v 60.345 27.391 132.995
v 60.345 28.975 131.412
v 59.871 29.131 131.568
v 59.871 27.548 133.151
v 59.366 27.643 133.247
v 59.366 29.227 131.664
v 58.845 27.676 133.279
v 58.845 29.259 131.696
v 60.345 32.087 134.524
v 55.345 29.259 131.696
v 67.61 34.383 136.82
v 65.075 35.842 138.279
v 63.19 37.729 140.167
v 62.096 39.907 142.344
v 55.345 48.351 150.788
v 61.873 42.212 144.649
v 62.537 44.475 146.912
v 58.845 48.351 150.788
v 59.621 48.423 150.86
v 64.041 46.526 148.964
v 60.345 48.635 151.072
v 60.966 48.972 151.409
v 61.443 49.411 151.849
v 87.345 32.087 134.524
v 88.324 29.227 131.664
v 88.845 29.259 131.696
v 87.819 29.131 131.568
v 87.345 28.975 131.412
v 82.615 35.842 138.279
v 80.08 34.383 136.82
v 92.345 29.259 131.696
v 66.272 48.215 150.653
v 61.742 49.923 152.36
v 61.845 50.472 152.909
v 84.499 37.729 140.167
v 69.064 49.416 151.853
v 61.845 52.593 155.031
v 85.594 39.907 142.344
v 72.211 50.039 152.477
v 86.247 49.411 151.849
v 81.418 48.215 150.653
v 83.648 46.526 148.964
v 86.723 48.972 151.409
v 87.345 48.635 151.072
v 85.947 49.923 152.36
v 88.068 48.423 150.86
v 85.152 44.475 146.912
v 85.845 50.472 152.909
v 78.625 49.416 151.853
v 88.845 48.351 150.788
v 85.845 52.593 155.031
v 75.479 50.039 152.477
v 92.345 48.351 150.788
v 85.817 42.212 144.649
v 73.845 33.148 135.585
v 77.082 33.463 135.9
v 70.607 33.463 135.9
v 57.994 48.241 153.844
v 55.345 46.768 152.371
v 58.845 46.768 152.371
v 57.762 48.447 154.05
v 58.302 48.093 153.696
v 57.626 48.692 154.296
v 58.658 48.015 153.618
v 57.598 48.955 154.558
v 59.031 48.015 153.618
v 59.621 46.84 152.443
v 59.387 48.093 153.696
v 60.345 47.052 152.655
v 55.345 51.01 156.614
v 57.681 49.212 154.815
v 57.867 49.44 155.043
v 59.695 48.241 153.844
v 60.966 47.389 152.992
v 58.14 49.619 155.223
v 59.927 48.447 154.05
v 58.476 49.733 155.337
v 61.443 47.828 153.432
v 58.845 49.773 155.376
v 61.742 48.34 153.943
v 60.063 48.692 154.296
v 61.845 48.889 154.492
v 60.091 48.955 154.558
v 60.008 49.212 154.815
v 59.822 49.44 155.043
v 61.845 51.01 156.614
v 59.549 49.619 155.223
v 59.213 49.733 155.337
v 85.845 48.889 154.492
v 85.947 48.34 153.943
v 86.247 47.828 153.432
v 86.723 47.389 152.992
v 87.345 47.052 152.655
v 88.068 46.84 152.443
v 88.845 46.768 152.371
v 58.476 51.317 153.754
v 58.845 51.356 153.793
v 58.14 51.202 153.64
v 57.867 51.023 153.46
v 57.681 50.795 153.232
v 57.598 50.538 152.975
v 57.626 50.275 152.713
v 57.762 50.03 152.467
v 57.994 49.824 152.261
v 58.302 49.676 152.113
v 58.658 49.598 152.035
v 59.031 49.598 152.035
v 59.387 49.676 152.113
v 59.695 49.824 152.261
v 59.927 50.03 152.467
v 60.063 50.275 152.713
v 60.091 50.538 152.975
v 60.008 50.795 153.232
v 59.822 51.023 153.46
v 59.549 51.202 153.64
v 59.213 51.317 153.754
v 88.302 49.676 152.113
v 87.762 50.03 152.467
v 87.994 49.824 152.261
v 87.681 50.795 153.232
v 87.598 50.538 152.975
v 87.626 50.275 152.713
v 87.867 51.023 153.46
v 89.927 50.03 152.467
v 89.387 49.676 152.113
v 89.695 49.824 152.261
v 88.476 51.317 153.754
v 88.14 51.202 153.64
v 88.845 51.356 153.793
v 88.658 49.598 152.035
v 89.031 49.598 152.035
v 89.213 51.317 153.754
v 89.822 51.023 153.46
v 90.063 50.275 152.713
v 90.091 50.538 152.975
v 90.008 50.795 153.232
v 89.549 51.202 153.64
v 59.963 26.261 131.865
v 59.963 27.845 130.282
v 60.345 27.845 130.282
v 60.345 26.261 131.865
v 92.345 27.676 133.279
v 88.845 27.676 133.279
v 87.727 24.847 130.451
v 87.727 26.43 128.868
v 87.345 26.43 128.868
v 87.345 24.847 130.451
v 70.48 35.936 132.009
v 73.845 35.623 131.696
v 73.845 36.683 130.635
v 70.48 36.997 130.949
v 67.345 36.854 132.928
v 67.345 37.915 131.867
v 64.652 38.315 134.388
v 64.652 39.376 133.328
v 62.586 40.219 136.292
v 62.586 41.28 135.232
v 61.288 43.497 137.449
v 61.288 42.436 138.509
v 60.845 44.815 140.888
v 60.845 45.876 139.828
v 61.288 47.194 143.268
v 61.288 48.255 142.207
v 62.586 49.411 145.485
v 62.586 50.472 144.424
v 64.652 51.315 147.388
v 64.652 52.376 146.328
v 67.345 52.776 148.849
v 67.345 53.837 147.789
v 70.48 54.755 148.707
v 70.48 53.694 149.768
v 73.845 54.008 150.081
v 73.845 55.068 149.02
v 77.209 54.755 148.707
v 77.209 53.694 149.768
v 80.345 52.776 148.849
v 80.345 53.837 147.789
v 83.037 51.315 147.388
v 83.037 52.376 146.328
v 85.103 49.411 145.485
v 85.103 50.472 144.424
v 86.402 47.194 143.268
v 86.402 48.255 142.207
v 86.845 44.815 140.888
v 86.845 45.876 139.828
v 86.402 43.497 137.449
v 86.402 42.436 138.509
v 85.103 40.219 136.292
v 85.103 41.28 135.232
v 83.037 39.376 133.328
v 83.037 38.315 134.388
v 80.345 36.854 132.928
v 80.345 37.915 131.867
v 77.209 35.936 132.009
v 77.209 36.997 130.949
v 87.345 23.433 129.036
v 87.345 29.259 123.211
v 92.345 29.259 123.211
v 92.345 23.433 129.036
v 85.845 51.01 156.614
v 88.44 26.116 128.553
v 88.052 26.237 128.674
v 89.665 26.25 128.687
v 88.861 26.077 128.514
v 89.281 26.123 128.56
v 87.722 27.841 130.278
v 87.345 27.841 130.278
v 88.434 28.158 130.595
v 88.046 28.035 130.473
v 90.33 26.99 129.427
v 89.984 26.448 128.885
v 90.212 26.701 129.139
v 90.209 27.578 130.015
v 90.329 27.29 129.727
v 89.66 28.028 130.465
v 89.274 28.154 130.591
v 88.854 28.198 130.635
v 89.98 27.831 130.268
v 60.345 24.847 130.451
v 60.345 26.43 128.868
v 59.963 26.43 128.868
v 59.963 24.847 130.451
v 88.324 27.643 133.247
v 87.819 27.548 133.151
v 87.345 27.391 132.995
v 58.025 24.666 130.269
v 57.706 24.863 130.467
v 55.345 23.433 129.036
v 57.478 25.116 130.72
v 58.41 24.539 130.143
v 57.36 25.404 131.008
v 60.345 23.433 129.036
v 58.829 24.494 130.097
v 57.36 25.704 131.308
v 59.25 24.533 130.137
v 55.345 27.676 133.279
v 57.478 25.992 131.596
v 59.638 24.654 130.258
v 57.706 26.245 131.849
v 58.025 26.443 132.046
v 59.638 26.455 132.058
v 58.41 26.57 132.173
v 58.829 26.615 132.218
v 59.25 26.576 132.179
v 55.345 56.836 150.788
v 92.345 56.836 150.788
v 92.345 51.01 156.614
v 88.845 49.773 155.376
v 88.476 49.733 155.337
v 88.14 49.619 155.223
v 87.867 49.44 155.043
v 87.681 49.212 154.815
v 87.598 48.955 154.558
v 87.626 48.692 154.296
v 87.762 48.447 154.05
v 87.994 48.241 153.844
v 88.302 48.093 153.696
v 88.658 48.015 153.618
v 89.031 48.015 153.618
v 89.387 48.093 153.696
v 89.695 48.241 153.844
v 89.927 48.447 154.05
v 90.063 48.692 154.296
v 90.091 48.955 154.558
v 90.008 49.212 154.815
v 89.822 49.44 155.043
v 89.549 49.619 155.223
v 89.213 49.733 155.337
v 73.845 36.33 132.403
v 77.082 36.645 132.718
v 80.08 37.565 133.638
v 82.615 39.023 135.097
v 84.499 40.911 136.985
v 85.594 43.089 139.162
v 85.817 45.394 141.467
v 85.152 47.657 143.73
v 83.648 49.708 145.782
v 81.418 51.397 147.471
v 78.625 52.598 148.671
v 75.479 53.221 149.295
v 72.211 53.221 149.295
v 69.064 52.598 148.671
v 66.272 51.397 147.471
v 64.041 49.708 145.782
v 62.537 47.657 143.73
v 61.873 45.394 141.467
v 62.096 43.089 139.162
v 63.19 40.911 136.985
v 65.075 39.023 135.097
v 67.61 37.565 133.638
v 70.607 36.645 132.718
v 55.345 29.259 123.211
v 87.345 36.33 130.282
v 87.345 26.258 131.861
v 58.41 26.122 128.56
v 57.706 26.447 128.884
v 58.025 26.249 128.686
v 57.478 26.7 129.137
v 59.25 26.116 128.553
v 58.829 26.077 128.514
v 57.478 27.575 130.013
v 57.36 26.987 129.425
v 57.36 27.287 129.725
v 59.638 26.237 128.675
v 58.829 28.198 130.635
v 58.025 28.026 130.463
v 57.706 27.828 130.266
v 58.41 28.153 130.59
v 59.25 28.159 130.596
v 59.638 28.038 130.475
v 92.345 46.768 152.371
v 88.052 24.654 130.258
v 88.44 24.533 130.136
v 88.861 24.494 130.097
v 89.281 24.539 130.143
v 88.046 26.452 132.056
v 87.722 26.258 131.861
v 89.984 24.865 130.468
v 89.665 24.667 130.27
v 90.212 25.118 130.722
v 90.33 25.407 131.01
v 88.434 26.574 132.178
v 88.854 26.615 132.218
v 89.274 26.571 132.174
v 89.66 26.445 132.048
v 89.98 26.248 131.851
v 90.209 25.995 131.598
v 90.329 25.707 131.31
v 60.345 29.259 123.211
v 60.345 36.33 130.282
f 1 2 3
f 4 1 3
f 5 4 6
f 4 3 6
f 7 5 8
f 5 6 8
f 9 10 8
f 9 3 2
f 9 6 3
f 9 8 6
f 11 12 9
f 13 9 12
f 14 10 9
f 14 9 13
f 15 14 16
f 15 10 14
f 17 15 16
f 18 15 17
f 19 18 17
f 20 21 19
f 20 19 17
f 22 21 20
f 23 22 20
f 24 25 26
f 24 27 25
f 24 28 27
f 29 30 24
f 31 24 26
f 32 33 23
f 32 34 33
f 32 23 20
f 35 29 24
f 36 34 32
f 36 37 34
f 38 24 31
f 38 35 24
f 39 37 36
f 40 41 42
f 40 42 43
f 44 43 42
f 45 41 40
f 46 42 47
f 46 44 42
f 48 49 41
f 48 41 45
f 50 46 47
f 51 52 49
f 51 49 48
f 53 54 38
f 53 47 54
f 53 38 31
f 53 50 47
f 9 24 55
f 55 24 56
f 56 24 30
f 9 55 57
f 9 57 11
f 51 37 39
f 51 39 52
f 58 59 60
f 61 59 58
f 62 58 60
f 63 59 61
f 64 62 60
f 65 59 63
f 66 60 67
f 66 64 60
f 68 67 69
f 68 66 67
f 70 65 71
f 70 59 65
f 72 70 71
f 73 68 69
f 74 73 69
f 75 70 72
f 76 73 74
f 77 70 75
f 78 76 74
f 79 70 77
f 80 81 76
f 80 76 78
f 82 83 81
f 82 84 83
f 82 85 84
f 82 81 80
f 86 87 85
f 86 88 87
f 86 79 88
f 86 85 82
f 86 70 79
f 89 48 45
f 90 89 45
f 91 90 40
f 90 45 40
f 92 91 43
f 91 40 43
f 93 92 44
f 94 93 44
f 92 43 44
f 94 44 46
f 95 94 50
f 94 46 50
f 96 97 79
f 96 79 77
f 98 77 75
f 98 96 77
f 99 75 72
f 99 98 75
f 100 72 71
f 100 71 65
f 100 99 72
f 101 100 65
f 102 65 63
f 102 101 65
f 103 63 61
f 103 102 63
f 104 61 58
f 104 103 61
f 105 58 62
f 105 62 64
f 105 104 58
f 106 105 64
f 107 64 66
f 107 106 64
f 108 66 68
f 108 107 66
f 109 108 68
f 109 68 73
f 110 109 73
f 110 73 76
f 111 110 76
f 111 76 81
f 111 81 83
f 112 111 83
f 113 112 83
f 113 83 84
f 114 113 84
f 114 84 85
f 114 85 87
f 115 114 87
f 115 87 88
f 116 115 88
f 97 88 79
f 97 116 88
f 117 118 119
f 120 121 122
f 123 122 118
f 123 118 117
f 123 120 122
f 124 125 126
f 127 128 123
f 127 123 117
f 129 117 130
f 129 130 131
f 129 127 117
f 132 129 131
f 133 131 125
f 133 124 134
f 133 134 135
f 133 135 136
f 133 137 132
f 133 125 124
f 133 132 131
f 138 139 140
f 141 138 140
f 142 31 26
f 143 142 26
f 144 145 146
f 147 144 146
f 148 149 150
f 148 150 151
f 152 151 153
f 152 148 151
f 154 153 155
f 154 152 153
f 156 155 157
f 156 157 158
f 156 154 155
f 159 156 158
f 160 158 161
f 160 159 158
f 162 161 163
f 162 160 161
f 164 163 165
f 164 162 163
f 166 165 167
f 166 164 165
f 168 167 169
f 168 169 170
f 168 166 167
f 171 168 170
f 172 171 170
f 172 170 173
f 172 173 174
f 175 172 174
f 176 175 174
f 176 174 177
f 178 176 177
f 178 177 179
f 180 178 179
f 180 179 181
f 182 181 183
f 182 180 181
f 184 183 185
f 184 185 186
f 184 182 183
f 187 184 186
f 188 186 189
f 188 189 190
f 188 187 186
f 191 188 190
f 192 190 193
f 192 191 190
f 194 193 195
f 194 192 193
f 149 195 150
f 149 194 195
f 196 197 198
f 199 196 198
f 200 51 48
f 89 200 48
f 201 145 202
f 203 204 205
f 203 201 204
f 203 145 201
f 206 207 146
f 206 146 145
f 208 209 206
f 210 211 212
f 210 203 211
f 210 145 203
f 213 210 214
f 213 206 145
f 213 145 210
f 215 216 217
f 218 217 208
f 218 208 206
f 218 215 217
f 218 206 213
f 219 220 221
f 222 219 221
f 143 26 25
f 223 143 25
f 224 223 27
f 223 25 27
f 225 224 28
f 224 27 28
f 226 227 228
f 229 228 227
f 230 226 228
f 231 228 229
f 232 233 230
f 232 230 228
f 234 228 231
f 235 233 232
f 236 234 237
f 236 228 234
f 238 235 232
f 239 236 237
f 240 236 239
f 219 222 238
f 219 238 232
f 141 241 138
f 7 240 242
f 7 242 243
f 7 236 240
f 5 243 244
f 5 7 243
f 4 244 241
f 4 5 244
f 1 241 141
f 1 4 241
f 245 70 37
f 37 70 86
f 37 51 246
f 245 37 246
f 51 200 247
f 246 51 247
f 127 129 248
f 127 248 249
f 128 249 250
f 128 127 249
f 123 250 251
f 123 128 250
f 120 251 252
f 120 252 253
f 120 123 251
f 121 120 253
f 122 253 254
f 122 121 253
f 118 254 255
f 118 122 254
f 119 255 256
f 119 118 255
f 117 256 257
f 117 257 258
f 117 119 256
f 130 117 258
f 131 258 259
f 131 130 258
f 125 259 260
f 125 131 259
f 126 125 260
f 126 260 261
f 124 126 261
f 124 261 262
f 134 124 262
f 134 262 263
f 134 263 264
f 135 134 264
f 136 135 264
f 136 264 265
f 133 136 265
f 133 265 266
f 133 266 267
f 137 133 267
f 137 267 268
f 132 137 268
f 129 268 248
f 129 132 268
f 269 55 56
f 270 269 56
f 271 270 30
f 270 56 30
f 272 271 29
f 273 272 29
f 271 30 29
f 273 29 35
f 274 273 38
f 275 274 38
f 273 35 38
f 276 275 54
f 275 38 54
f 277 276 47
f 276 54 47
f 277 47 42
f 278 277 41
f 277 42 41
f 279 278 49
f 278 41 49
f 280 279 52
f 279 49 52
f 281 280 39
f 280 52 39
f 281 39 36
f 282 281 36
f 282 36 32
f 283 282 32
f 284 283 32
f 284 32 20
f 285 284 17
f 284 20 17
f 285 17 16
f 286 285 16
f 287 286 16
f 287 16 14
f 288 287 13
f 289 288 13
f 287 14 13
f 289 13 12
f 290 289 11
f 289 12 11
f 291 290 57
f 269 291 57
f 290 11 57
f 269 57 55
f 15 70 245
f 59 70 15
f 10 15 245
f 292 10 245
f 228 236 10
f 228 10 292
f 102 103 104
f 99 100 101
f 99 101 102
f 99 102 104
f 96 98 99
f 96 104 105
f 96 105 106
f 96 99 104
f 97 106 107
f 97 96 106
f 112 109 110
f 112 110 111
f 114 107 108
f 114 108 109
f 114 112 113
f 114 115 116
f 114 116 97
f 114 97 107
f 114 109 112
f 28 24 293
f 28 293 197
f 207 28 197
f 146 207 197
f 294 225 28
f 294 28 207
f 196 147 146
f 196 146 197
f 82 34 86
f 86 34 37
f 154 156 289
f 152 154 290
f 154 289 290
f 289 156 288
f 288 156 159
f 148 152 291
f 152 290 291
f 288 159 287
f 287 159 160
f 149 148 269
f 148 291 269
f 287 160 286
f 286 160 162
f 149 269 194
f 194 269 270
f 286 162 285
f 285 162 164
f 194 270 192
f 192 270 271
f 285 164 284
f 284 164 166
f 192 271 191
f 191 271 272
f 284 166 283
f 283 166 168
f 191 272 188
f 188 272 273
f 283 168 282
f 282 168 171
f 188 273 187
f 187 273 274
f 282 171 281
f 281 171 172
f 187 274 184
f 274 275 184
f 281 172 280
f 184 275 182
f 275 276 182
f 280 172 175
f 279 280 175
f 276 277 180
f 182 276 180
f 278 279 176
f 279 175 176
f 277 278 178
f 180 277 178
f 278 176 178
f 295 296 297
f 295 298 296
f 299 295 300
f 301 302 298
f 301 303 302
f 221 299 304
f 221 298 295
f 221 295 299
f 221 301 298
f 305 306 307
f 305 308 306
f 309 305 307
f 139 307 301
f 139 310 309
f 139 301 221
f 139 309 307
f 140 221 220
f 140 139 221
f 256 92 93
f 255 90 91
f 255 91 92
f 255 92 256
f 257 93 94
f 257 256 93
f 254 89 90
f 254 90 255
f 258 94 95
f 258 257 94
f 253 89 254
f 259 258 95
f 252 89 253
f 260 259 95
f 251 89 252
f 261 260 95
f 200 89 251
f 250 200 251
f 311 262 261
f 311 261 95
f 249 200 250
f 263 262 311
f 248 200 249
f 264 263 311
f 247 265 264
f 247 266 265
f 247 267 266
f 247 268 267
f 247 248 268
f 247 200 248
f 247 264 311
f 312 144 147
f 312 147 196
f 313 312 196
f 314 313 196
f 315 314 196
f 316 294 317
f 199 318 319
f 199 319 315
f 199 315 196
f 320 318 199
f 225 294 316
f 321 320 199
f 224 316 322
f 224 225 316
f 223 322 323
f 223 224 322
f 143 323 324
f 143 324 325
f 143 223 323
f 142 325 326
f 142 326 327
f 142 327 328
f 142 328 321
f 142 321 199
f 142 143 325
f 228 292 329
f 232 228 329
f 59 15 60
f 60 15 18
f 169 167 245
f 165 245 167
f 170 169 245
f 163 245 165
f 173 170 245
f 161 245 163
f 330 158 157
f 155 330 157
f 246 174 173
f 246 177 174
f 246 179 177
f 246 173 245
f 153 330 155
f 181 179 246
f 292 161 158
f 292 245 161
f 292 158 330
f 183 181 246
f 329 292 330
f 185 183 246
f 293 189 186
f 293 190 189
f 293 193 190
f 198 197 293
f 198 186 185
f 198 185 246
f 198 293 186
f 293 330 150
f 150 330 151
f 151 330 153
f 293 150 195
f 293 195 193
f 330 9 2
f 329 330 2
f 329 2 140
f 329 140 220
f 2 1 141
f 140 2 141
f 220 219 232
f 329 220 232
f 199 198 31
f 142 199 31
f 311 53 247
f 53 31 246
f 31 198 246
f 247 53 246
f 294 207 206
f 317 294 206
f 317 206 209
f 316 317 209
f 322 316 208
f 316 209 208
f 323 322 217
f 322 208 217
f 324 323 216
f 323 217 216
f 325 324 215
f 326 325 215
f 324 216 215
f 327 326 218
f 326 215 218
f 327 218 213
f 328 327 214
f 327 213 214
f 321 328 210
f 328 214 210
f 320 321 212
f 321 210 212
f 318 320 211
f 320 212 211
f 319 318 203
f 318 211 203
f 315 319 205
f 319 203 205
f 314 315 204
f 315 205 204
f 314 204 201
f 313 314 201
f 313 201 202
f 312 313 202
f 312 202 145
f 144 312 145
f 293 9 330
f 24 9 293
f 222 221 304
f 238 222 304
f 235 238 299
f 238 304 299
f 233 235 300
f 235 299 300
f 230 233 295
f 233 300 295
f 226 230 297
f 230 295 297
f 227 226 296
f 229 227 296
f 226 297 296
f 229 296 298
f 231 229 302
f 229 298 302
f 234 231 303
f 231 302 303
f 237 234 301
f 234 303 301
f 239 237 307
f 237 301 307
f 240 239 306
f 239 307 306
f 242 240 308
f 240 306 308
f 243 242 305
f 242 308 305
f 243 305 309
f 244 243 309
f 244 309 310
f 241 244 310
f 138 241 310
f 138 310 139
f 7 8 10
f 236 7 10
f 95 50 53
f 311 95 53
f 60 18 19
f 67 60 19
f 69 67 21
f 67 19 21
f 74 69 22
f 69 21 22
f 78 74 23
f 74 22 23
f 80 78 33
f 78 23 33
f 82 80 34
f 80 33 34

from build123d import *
from OCP.BRepAlgoAPI import BRepAlgoAPI_Cut
from OCP.TopTools import TopTools_ListOfShape

# Parameters (mm, degrees)
SKETCH3_W               = 37
SKETCH3_H               = 39
SKETCH3_R               = 12
BOSS_EXTRUDE1_DEPTH     = 4.5
SKETCH4_W               = 37
SKETCH4_H               = 39
SKETCH4_R               = 13
BOSS_EXTRUDE2_DEPTH     = 1.5
SKETCH5_R               = 1.25
BOSS_EXTRUDE4_DEPTH     = 2.238877686
CUT_EXTRUDE1_DEPTH      = 3
CUT_EXTRUDE1_DEPTH_BACK = 7.261122
SKETCH7_W               = 27
SKETCH7_H               = 10


with BuildPart() as part:
    # Sketch3 → Boss-Extrude1 (new body)
    with BuildSketch(Plane(origin=(0, -51.218608926, 51.218608926), x_dir=(1, 0, 0), z_dir=(-2.4581031654591364e-15, -0.7071067811865478, 0.7071067811865472))):
        with Locations((73.844609768, 127.312236852)):
            Rectangle(SKETCH3_W, SKETCH3_H)
        with Locations(Location((73.844609768, 131.312236852, 0), (0, 0, 270))):
            Circle(SKETCH3_R, mode=Mode.SUBTRACT)
    extrude(amount=-BOSS_EXTRUDE1_DEPTH)

    # Sketch4 → Boss-Extrude2 (add)
    with BuildSketch(Plane(origin=(0, -48.036628411, 48.036628411), x_dir=(1, 0, 0), z_dir=(2.4581031654591364e-15, 0.7071067811865478, -0.7071067811865472))):
        with Locations((73.844609768, -127.312236852)):
            Rectangle(SKETCH4_W, SKETCH4_H)
        with Locations(Location((73.844609768, -131.312236852, 0), (0, 0, 90))):
            Circle(SKETCH4_R, mode=Mode.SUBTRACT)
    extrude(amount=BOSS_EXTRUDE2_DEPTH)

    # Sketch5 → Boss-Extrude4 (add)
    # profile 1 of 4: a face of its own
    with BuildSketch(Plane(origin=(0, -51.218608926, 51.218608926), x_dir=(1, 0, 0), z_dir=(-2.386964886512496e-15, -0.7071067811865477, 0.7071067811865475))):
        with BuildLine():
            Line((92.344609768, 107.812236852), (92.344609768, 113.812236852))
            Line((92.344609768, 113.812236852), (88.844609768, 113.812236852))
            ThreePointArc((88.844609768, 113.812236852), (88.068152632, 113.710014331), (87.344609768, 113.410313064))
            Line((87.344609768, 113.410313064), (87.344609768, 111.807298734))
            Line((87.344609768, 111.807298734), (87.722178544, 111.807298734))
            ThreePointArc((87.722178544, 111.807298734), (90.344606124, 110.815542933), (87.726575779, 109.812236852))
            Line((87.726575779, 109.812236852), (87.344609768, 109.812236852))
            Line((87.344609768, 109.812236852), (87.344609768, 107.812236852))
            Line((87.344609768, 107.812236852), (92.344609768, 107.812236852))
        make_face()
    # profile 2 of 4: a face of its own
    with BuildSketch(Plane(origin=(0, -51.218608926, 51.218608926), x_dir=(1, 0, 0), z_dir=(-2.386964886512496e-15, -0.7071067811865477, 0.7071067811865475))):
        with BuildLine():
            Line((55.344609768, 107.812236852), (60.344609768, 107.812236852))
            Line((60.344609768, 107.812236852), (60.344609768, 109.812236852))
            Line((60.344609768, 109.812236852), (59.962643756, 109.812236852))
            ThreePointArc((59.962643756, 109.812236852), (57.344609768, 110.812236852), (59.962643756, 111.812236852))
            Line((59.962643756, 111.812236852), (60.344609768, 111.812236852))
            Line((60.344609768, 111.812236852), (60.344609768, 113.410313064))
            ThreePointArc((60.344609768, 113.410313064), (59.621066903, 113.710014331), (58.844609768, 113.812236852))
            Line((58.844609768, 113.812236852), (55.344609768, 113.812236852))
            Line((55.344609768, 113.812236852), (55.344609768, 107.812236852))
        make_face()
    # profile 3 of 4: a face of its own
    with BuildSketch(Plane(origin=(0, -51.218608926, 51.218608926), x_dir=(1, 0, 0), z_dir=(-2.386964886512496e-15, -0.7071067811865477, 0.7071067811865475))):
        with BuildLine():
            Line((55.344609768, 146.812236852), (55.344609768, 140.812236852))
            Line((55.344609768, 140.812236852), (58.844609768, 140.812236852))
            ThreePointArc((58.844609768, 140.812236852), (60.965930111, 141.690916509), (61.844609768, 143.812236852))
            Line((61.844609768, 143.812236852), (61.844609768, 146.812236852))
            Line((61.844609768, 146.812236852), (55.344609768, 146.812236852))
        make_face()
        with Locations(Location((58.844609768, 143.812236852, 0), (0, 0, 90))):
            Circle(SKETCH5_R, mode=Mode.SUBTRACT)
    # profile 4 of 4: a face of its own
    with BuildSketch(Plane(origin=(0, -51.218608926, 51.218608926), x_dir=(1, 0, 0), z_dir=(-2.386964886512496e-15, -0.7071067811865477, 0.7071067811865475))):
        with BuildLine():
            Line((92.344609768, 146.812236852), (85.844609768, 146.812236852))
            Line((85.844609768, 146.812236852), (85.844609768, 143.812236852))
            ThreePointArc((85.844609768, 143.812236852), (86.723289424, 141.690916509), (88.844609768, 140.812236852))
            Line((88.844609768, 140.812236852), (92.344609768, 140.812236852))
            Line((92.344609768, 140.812236852), (92.344609768, 146.812236852))
        make_face()
        with Locations(Location((88.844609768, 143.812236852, 0), (0, 0, 90))):
            Circle(SKETCH5_R, mode=Mode.SUBTRACT)
    extrude(amount=BOSS_EXTRUDE4_DEPTH)


with BuildPart() as cut_extrude1_tool:
    # Sketch7 → Cut-Extrude1 (new, two sides: drawn at the far end of the back side and taken through both)
    with BuildSketch(Plane(origin=(0, -46.084220099, 46.084220099), x_dir=(1, 0, 0), z_dir=(0, 0.7071067811865502, -0.7071067811865449)).offset(-CUT_EXTRUDE1_DEPTH_BACK)):
        with Locations((73.844609768, -112.812236852)):
            Rectangle(SKETCH7_W, SKETCH7_H)
    extrude(amount=CUT_EXTRUDE1_DEPTH + CUT_EXTRUDE1_DEPTH_BACK)


with BuildPart() as part_1:
    add(part.part)

    # Cut-Extrude1: cut by cut_extrude1_tool, with a tolerance
    cut_extrude1_stock = TopTools_ListOfShape()
    cut_extrude1_stock.Append(part_1.part.wrapped)
    cut_extrude1_tools = TopTools_ListOfShape()
    cut_extrude1_tools.Append(cut_extrude1_tool.part.wrapped)
    cut_extrude1_cut = BRepAlgoAPI_Cut()
    cut_extrude1_cut.SetArguments(cut_extrude1_stock)
    cut_extrude1_cut.SetTools(cut_extrude1_tools)
    cut_extrude1_cut.SetFuzzyValue(0.00001)
    cut_extrude1_cut.Build()
    add(Compound.cast(cut_extrude1_cut.Shape()).solids(), mode=Mode.REPLACE)


solid = part_1.part
